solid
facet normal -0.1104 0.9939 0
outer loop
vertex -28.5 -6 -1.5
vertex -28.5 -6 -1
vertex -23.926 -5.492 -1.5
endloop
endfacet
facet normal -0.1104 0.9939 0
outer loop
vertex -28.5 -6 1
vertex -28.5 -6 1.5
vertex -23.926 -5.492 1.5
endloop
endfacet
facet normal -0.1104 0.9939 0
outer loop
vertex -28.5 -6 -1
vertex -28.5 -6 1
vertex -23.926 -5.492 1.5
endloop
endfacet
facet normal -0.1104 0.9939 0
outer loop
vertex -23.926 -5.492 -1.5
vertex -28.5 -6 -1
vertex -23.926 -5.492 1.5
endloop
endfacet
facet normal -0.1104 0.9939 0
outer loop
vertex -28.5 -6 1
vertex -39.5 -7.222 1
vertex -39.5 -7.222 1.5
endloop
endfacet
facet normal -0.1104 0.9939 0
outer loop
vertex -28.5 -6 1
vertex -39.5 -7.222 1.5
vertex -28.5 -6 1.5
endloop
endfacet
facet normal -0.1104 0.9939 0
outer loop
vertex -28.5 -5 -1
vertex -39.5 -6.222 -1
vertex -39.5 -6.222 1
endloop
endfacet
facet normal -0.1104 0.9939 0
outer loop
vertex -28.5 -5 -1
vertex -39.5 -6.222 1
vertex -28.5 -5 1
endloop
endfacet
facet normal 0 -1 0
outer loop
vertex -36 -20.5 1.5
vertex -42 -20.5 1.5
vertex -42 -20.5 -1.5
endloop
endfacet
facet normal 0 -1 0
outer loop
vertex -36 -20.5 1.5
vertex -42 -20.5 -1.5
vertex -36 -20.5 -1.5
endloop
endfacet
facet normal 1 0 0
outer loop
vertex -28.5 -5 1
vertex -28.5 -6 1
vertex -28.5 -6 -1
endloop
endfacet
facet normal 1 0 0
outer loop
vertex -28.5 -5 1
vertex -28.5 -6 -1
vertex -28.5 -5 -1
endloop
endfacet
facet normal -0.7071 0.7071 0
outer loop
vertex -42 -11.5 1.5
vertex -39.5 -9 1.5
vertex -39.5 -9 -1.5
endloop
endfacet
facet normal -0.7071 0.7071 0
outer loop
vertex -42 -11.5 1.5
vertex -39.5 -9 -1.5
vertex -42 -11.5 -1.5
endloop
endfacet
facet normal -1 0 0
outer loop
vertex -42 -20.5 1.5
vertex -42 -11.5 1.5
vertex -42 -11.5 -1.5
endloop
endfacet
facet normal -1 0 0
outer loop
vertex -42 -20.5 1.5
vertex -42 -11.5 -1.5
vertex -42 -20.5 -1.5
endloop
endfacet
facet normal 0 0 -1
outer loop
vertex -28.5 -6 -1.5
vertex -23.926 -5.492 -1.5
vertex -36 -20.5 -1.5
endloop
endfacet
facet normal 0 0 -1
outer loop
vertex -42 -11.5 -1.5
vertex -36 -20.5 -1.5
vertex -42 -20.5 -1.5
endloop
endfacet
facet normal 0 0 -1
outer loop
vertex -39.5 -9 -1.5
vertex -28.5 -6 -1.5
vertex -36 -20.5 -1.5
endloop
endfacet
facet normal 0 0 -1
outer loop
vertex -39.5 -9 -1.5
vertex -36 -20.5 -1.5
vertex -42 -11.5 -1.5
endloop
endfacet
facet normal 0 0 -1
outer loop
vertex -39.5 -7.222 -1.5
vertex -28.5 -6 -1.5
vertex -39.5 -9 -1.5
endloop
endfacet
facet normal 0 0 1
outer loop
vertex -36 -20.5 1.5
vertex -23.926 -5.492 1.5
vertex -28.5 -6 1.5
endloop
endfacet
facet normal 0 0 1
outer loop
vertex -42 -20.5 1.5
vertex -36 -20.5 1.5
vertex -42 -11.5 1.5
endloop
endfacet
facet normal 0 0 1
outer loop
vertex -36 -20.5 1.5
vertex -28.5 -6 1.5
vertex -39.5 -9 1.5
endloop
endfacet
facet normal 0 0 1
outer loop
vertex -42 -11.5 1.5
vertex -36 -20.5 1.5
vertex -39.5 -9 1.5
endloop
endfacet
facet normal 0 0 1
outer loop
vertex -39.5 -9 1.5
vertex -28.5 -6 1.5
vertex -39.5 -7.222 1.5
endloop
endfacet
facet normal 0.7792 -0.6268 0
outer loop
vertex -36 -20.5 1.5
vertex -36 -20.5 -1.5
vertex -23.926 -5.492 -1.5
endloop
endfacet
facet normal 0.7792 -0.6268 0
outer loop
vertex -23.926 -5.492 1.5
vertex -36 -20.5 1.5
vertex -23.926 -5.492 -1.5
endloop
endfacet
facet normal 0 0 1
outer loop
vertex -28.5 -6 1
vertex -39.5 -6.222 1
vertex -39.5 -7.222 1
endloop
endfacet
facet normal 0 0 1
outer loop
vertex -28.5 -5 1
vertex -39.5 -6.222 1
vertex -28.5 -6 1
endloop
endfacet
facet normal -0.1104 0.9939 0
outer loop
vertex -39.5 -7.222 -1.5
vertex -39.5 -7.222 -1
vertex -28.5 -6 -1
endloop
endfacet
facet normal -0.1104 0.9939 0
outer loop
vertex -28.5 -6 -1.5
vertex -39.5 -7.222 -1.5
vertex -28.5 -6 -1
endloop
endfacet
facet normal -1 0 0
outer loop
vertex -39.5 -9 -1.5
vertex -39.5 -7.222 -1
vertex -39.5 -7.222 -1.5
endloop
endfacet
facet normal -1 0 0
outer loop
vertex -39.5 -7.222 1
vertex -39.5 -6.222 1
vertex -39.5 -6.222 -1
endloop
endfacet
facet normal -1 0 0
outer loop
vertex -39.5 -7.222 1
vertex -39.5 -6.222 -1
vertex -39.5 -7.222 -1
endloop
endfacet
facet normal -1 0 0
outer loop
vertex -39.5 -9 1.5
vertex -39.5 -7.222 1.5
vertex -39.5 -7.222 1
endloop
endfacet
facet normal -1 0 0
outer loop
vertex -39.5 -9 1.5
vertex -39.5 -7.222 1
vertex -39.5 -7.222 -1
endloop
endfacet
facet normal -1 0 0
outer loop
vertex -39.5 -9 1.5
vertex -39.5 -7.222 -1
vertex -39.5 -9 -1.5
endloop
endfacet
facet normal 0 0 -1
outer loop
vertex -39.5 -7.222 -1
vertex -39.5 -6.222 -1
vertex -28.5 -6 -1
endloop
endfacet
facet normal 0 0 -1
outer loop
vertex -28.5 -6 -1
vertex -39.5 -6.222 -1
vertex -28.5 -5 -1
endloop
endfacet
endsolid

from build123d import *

# Parameters (mm, degrees)
BOSS_EXTRUDE1_DEPTH      = 1.5
SKETCH1_4_W              = 11
SKETCH1_4_H              = 2
BOSS_EXTRUDE2_DEPTH      = 1
BOSS_EXTRUDE3_DEPTH      = 0.5
BOSS_EXTRUDE3_DEPTH_BACK = 2.5
CUT_EXTRUDE1_DEPTH       = 2.5
CUT_EXTRUDE2_START       = -2
CUT_EXTRUDE2_DEPTH       = 2.5
CUT_EXTRUDE3_DEPTH       = 10
SKETCH5_W                = 11.067692947
SKETCH5_H                = 2
CUT_EXTRUDE4_DEPTH       = 1
CUT_EXTRUDE5_DEPTH       = 6
CUT_EXTRUDE6_DEPTH       = 6


with BuildPart() as part:
    # Sketch1 → Boss-Extrude1 (new, symmetric)
    with BuildSketch(Plane.XY):
        Polygon((-28.5, -6), (-39.5, -6), (-39.5, -9), (-42, -11.5), (-42, -20.5), (-36, -20.5), (-24.008925726, -8.508925726), (-21.5, -6), align=None)
    extrude(amount=BOSS_EXTRUDE1_DEPTH, both=True)

    # Sketch1<4> → Boss-Extrude2 (add, symmetric)
    with BuildSketch(Plane.XY):
        with Locations((-34, -5)):
            Rectangle(SKETCH1_4_W, SKETCH1_4_H)
    extrude(amount=BOSS_EXTRUDE2_DEPTH, both=True)

    # Sketch2 → Boss-Extrude3 (add, two sides: drawn at the far end of the back side and taken through both)
    with BuildSketch(Plane(origin=(0, 0, -1), x_dir=(-1, 0, 0), z_dir=(0, 0, -1)).offset(-BOSS_EXTRUDE3_DEPTH_BACK)):
        Polygon((21.5, -6), (28.5, -6), (20.625, -5.125), align=None)
    extrude(amount=BOSS_EXTRUDE3_DEPTH + BOSS_EXTRUDE3_DEPTH_BACK)

    # Sketch2<3> → Cut-Extrude1 (cut)
    with BuildSketch(Plane(origin=(0, 0, -1), x_dir=(-1, 0, 0), z_dir=(0, 0, -1))):
        Polygon((39.5, -7.222222222), (39.5, -6), (28.5, -6), align=None)
    extrude(amount=CUT_EXTRUDE1_DEPTH, mode=Mode.SUBTRACT)

    # Sketch2<4> → Cut-Extrude2 (cut)
    with BuildSketch(Plane(origin=(0, 0, -1), x_dir=(-1, 0, 0), z_dir=(0, 0, -1)).offset(CUT_EXTRUDE2_START)):
        Polygon((39.5, -7.222222222), (39.5, -6), (28.5, -6), align=None)
    extrude(amount=-CUT_EXTRUDE2_DEPTH, mode=Mode.SUBTRACT)

    # Sketch3 → Cut-Extrude3 (cut)
    with BuildSketch(Plane(origin=(0, 0, -1), x_dir=(-1, 0, 0), z_dir=(0, 0, -1))):
        Polygon((28.5, -4), (39.5, -5.222222222), (39.5, -4), align=None)
    extrude(amount=-CUT_EXTRUDE3_DEPTH, mode=Mode.SUBTRACT)

    # Sketch5 → Cut-Extrude4 (cut, along a direction that is not the sketch's normal)
    with BuildSketch(Plane(origin=(0.091463415, -0.823170732, 0), x_dir=(0.993883734673619, 0.11043152607484619, 0), z_dir=(-0.11043152607484619, 0.993883734673619, 0))):
        with Locations((-34.301259016, 0)):
            Rectangle(SKETCH5_W, SKETCH5_H)
    extrude(amount=-CUT_EXTRUDE4_DEPTH, dir=(0, 1, 0), mode=Mode.SUBTRACT)

    # Sketch6 → Cut-Extrude5 (cut)
    with BuildSketch(Plane(origin=(0, 0, -1.5), x_dir=(-1, 0, 0), z_dir=(0, 0, -1))):
        Polygon((22.46223447, -5.329137163), (22.29892474, -6.79892474), (20.531436433, -7.019526438), (20.056691247, -4.979132235), (21.915268146, -4.302367821), align=None)
    extrude(amount=-CUT_EXTRUDE5_DEPTH, mode=Mode.SUBTRACT)

    # Sketch7 → Cut-Extrude6 (cut)
    with BuildSketch(Plane(origin=(0, 0, -1.5), x_dir=(-1, 0, 0), z_dir=(0, 0, -1))):
        Polygon((22.29892474, -6.79892474), (36, -20.5), (23.926432251, -5.491825806), (22.46223447, -5.329137163), align=None)
    extrude(amount=-CUT_EXTRUDE6_DEPTH, mode=Mode.SUBTRACT)


solid = part.part
